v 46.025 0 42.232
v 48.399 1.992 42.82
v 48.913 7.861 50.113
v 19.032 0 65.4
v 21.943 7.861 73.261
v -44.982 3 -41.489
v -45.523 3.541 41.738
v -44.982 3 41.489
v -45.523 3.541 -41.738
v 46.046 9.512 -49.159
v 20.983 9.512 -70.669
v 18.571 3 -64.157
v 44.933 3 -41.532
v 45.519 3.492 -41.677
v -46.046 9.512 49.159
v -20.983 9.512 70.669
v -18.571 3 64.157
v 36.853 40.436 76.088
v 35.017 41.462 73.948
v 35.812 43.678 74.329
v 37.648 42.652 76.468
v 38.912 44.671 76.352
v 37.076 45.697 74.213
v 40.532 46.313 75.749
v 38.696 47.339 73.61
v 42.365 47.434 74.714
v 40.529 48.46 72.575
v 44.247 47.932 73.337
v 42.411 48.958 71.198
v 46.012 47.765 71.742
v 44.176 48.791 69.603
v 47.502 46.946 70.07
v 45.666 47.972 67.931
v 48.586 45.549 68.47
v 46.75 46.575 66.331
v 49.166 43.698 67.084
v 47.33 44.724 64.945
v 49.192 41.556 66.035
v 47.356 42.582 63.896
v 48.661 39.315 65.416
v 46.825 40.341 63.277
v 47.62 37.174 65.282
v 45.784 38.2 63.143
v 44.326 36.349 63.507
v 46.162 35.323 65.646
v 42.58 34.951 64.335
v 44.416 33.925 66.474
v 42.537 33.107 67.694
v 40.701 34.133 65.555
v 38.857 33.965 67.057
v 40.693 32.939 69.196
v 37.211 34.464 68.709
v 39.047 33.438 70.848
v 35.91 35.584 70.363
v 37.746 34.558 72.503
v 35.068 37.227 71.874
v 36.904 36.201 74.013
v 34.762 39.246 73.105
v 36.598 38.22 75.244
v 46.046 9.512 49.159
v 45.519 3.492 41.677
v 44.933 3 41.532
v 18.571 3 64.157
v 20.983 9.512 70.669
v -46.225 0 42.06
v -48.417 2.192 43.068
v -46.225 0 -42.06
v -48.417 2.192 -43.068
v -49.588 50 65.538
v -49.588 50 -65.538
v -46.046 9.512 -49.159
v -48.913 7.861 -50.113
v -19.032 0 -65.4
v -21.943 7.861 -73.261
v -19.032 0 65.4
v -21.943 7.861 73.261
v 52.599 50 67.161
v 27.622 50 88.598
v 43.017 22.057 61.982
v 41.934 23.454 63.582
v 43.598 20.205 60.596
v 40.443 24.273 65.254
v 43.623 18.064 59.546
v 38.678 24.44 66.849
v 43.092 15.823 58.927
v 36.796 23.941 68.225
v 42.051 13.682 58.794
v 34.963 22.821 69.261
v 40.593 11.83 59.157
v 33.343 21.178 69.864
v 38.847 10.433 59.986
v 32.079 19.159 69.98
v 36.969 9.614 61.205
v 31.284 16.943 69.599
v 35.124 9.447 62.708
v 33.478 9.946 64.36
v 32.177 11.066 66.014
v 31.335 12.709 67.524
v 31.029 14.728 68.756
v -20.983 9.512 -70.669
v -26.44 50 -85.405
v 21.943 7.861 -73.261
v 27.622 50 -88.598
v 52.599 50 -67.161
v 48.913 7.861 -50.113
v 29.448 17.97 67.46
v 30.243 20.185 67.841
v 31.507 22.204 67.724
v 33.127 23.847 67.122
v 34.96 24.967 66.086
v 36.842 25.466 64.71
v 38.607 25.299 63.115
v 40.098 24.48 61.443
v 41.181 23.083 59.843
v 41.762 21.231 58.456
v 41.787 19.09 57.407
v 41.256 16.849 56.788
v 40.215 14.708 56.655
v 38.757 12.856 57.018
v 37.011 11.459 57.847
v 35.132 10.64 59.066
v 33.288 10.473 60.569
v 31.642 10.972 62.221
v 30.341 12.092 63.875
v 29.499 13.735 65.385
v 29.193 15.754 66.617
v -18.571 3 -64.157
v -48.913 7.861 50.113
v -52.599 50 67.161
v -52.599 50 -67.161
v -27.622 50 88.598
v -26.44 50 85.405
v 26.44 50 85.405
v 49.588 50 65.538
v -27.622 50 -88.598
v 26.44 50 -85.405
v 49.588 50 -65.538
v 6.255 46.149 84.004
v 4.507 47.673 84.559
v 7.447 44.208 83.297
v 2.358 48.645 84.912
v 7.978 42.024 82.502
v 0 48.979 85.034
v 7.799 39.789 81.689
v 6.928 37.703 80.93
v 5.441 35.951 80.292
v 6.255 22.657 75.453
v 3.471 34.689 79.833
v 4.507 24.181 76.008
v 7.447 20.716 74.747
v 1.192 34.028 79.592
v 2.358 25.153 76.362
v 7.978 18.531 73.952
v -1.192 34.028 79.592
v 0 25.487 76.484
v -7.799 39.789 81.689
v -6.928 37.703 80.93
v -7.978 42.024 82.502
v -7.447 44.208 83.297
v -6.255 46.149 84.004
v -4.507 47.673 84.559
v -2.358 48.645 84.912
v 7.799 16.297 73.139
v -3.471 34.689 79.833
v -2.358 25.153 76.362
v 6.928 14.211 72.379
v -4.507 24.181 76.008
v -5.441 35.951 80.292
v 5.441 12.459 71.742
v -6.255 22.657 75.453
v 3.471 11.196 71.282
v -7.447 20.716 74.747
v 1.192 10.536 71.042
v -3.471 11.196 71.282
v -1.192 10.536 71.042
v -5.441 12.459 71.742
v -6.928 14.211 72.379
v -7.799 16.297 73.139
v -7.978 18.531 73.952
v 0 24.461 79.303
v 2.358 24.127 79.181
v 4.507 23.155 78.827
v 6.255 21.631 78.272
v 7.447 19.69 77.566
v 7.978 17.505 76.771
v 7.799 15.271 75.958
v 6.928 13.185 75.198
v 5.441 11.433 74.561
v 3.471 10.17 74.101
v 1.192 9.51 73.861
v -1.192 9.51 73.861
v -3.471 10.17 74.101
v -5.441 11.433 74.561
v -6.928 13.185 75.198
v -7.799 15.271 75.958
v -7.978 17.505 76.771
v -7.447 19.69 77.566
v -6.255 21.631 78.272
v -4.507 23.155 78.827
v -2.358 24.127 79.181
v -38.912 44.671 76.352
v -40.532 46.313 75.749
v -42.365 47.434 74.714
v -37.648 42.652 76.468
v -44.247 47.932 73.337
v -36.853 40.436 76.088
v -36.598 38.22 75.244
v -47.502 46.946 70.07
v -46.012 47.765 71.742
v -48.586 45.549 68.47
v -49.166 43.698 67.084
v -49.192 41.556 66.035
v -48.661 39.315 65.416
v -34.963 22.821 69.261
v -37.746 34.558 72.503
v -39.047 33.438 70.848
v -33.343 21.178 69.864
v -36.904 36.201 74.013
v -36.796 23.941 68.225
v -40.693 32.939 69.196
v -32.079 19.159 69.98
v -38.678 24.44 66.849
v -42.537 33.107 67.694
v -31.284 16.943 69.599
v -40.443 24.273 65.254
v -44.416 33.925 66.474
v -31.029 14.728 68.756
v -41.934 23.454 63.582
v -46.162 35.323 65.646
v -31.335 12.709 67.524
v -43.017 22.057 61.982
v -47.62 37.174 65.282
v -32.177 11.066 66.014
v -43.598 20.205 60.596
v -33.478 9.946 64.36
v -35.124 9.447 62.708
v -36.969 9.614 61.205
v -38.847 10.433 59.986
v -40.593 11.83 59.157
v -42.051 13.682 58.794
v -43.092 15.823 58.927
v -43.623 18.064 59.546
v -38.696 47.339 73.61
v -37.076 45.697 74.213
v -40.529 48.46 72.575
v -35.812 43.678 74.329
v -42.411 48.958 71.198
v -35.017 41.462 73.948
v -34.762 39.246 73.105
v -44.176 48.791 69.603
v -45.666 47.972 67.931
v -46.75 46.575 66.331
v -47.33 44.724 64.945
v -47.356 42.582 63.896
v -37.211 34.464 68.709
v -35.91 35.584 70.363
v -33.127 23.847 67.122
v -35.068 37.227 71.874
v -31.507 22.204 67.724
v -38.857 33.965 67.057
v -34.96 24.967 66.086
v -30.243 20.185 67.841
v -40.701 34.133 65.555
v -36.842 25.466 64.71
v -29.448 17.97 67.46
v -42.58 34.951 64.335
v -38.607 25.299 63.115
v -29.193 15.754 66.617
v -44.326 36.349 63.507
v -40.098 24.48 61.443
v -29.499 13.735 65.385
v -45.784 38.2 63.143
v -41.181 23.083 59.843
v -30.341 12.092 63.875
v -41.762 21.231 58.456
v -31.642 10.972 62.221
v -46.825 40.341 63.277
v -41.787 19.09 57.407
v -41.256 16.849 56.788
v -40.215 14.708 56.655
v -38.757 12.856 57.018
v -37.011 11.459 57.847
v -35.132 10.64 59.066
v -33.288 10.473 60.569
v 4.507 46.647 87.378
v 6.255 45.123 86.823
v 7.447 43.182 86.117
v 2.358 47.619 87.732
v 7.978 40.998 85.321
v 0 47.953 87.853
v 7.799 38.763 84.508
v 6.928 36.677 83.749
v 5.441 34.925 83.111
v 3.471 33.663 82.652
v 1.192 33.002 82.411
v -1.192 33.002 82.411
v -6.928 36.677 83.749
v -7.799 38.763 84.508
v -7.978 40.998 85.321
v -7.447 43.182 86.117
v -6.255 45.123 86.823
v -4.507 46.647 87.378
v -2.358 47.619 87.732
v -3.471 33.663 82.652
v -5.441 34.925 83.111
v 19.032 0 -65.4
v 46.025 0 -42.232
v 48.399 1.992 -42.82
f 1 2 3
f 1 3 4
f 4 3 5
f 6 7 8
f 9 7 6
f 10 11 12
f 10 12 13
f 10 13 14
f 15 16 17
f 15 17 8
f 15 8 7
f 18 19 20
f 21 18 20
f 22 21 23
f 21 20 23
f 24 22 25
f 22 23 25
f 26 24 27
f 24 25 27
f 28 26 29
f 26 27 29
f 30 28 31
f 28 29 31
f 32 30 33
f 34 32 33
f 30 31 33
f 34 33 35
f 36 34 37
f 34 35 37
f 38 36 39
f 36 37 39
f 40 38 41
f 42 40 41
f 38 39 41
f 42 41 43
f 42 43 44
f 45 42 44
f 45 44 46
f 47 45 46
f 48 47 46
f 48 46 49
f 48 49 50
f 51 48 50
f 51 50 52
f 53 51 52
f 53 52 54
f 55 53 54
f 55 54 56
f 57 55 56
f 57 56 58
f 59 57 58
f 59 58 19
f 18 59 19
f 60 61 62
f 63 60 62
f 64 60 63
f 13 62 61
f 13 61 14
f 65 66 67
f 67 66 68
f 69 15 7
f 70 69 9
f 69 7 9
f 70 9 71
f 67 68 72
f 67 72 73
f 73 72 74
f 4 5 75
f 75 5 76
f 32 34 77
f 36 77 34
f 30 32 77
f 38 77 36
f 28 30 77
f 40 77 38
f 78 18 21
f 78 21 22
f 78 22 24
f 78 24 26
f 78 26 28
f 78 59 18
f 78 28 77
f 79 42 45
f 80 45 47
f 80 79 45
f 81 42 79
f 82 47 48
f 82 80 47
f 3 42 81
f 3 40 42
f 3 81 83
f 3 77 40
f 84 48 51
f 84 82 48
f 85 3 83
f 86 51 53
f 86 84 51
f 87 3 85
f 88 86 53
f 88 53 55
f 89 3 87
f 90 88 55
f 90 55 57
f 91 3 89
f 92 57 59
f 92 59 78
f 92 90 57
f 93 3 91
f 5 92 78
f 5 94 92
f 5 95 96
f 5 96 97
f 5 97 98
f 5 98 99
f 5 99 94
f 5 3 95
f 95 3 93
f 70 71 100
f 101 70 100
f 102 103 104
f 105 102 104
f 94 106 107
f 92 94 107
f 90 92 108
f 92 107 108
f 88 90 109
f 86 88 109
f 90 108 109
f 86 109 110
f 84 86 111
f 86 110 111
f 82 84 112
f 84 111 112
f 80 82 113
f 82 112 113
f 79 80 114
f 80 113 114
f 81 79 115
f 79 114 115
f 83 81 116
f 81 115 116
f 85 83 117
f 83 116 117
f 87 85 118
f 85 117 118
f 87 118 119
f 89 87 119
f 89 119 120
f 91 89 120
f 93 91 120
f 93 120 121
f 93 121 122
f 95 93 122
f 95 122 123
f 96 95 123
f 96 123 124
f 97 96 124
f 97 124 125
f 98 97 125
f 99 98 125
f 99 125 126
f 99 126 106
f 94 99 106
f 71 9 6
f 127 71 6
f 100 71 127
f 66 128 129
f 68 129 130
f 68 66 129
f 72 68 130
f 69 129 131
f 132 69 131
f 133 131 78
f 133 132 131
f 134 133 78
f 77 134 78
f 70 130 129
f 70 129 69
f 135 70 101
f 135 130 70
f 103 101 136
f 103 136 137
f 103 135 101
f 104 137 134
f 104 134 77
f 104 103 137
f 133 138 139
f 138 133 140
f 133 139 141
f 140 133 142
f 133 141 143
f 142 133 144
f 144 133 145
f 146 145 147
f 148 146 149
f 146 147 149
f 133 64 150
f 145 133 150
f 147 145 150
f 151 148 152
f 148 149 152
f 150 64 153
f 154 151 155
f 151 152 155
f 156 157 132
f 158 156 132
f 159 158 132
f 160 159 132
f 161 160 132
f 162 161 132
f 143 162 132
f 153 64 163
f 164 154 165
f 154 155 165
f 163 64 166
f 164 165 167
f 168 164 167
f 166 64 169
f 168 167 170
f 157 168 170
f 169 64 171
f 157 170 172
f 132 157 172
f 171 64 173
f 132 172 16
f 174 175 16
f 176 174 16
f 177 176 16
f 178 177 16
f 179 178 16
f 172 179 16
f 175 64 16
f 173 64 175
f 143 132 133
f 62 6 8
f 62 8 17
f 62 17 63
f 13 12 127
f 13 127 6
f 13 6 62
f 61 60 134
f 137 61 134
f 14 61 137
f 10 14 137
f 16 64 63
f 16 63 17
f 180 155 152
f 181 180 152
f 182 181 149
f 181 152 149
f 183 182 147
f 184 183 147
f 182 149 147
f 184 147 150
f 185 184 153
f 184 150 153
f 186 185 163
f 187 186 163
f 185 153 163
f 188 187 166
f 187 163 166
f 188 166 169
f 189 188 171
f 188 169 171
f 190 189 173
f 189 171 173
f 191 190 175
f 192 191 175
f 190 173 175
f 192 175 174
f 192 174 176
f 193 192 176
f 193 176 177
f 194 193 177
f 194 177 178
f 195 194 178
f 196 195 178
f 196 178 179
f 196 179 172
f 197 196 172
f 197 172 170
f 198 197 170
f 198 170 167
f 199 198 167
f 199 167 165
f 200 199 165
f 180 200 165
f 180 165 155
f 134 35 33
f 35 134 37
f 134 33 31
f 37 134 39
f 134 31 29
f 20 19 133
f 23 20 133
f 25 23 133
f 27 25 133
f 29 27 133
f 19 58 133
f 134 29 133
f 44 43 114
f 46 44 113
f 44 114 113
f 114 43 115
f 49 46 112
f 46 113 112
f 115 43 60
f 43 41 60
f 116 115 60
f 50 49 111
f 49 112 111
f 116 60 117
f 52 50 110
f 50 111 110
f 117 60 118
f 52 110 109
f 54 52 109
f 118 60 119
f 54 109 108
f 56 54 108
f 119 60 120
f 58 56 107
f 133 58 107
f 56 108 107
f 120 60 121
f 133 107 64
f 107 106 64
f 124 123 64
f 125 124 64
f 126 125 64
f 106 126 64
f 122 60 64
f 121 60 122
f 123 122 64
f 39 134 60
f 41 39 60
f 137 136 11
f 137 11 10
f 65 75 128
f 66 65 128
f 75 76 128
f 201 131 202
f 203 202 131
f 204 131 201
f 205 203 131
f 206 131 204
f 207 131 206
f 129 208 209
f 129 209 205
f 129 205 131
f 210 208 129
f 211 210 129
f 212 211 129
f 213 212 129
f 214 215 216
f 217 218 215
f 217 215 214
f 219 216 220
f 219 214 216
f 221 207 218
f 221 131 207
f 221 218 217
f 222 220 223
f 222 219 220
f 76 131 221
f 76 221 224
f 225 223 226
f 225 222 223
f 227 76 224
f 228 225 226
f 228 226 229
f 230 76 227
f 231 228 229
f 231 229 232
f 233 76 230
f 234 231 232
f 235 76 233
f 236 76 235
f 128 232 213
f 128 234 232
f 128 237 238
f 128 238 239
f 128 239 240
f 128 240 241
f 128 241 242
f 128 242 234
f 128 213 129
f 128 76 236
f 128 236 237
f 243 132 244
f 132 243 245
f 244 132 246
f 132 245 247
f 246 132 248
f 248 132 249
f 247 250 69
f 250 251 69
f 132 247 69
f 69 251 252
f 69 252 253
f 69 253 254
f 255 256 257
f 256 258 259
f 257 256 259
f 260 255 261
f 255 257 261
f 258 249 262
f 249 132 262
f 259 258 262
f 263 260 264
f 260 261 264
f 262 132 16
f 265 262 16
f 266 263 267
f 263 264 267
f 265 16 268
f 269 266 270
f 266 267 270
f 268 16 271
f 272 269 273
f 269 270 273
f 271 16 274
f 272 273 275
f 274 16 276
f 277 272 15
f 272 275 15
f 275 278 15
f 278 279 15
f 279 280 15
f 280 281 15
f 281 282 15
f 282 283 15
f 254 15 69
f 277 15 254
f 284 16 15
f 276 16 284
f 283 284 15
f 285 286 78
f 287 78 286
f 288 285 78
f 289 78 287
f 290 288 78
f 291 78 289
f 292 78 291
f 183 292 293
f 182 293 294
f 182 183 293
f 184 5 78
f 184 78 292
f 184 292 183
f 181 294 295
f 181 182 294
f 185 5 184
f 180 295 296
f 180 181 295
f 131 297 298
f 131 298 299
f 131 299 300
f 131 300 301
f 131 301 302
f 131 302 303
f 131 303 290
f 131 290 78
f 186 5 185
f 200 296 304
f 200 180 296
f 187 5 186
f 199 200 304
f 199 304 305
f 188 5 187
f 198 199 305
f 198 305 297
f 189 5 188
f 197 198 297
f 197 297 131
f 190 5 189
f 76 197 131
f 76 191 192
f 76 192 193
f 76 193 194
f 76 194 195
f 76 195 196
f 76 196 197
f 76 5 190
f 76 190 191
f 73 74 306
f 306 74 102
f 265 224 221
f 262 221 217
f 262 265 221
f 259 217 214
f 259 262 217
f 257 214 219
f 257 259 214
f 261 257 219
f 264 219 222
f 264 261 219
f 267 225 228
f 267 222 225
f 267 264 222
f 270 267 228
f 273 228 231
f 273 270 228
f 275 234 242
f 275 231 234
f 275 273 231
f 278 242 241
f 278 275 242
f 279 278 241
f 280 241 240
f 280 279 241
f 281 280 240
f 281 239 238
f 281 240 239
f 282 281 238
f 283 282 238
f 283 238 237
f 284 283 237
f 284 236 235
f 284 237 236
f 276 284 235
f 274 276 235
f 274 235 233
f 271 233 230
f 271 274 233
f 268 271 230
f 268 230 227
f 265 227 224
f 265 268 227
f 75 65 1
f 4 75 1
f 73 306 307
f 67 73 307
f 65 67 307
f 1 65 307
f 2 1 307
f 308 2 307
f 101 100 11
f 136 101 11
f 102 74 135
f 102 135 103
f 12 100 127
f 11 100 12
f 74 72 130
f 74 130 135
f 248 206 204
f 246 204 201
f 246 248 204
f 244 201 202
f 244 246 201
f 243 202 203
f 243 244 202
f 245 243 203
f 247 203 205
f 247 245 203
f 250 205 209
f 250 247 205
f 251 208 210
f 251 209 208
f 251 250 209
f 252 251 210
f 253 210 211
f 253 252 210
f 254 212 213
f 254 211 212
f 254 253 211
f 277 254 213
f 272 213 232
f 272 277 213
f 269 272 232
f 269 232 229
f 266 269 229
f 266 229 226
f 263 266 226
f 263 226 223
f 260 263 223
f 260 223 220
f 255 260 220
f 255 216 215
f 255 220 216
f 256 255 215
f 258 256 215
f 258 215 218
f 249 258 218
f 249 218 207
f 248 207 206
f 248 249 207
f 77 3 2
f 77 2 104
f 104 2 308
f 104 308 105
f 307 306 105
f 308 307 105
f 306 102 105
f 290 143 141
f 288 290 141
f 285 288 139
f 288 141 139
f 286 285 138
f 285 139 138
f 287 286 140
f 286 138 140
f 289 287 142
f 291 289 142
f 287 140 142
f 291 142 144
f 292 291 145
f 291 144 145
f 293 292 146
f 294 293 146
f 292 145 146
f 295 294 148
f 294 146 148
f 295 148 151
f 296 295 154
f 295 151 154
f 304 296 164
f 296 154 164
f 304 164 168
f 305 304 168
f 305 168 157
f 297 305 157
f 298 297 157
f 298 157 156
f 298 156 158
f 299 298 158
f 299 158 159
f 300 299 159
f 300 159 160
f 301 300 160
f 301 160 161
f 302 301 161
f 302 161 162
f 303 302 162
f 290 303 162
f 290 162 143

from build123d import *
from OCP.BRepFilletAPI import BRepFilletAPI_MakeChamfer

# Parameters (mm, degrees)
SKETCH1_W             = 96.449496644
SKETCH1_H             = 93.866027984
BOSS_EXTRUDE1_DEPTH   = 50
DRAFT1_ANGLE          = 20
DRAFT2_ANGLE          = 5
CHAMFER1_SIZE         = 5
CHAMFER1_SIZE2        = 8.365785926
CHAMFER1_EDGE_2_SIZE  = 5
CHAMFER1_EDGE_2_SIZE2 = 8.365785926
CHAMFER1_EDGE_3_SIZE  = 5
CHAMFER1_EDGE_3_SIZE2 = 8.365785926
CHAMFER1_EDGE_4_SIZE  = 5
CHAMFER1_EDGE_4_SIZE2 = 8.365785926
CHAMFER1_EDGE_5_SIZE  = 5
CHAMFER1_EDGE_5_SIZE2 = 8.365785926
CHAMFER1_EDGE_6_SIZE  = 5
CHAMFER1_EDGE_6_SIZE2 = 8.365785926
CHAMFER2_SIZE         = 2
CHAMFER2_SIZE2        = 2.200125735
SHELL1_T              = -3
SKETCH2_R             = 8
CUT_EXTRUDE1_DEPTH    = 174.798113009
SKETCH3_R             = 8
CUT_EXTRUDE2_DEPTH    = 173.570101234


with BuildPart() as part:
    # Sketch1 → Boss-Extrude1 (new body)
    with BuildSketch(Plane(origin=(0, 0, 0), x_dir=(1, 0, 0), z_dir=(0, 1, 0))):
        Rectangle(SKETCH1_W, SKETCH1_H)
        Polygon((20.883038336, 70.399520989), (48.224748322, 46.933013992), (-48.224748322, 46.933013992), (-20.883038336, 70.399520989), align=None)
        Polygon((-48.224748322, -46.933013992), (48.224748322, -46.933013992), (20.883038336, -70.399520989), (-20.883038336, -70.399520989), align=None)
    extrude(amount=BOSS_EXTRUDE1_DEPTH)

    # Draft1
    draft1_faces = [part.faces().sort_by_distance(p)[0] for p in [
        (-34.553893329, 25, 58.66626749),
        (-34.553893329, 25, -58.66626749),
        (0, 25, -70.399520989),
        (34.553893329, 25, -58.66626749),
        (34.553893329, 25, 58.66626749),
        (0, 25, 70.399520989),
    ]]
    draft(draft1_faces, Plane(origin=(0, 0, 0), x_dir=(0, 0, -1), z_dir=(0, -1, 0)), DRAFT1_ANGLE)

    # Draft2
    draft2_faces = [part.faces().sort_by_distance(p)[0] for p in [
        (48.224748322, 26.695838409, 0),
        (-48.224748322, 26.695838409, 0),
    ]]
    draft(draft2_faces, Plane(origin=(0, 0, 0), x_dir=(0, 0, -1), z_dir=(0, -1, 0)), DRAFT2_ANGLE)

    # Chamfer1
    chamfer1_edges = [part.edges().sort_by_distance(p)[0] for p in [
        (0, 0, 70.399520989),
    ]]
    chamfer1_side = [part.faces().sort_by_distance(p)[0] for p in [
        (0, 0, 0),
    ]]
    chamfer(chamfer1_edges, length=CHAMFER1_SIZE, length2=CHAMFER1_SIZE2, reference=chamfer1_side[0])

    # Chamfer1 edge 2
    chamfer1_edge_2_edges = [part.edges().sort_by_distance(p)[0] for p in [
        (-34.553893329, 0, 58.66626749),
    ]]
    chamfer1_edge_2_side = [part.faces().sort_by_distance(p)[0] for p in [
        (0, 0, 0),
    ]]
    chamfer(chamfer1_edge_2_edges, length=CHAMFER1_EDGE_2_SIZE, length2=CHAMFER1_EDGE_2_SIZE2, reference=chamfer1_edge_2_side[0])

    # Chamfer1 edge 3
    chamfer1_edge_3_edges = [part.edges().sort_by_distance(p)[0] for p in [
        (-34.553893329, 0, -58.66626749),
    ]]
    chamfer1_edge_3_side = [part.faces().sort_by_distance(p)[0] for p in [
        (0, 0, 0),
    ]]
    chamfer(chamfer1_edge_3_edges, length=CHAMFER1_EDGE_3_SIZE, length2=CHAMFER1_EDGE_3_SIZE2, reference=chamfer1_edge_3_side[0])

    # Chamfer1 edge 4
    chamfer1_edge_4_edges = [part.edges().sort_by_distance(p)[0] for p in [
        (0, 0, -70.399520989),
    ]]
    chamfer1_edge_4_side = [part.faces().sort_by_distance(p)[0] for p in [
        (0, 0, 0),
    ]]
    chamfer(chamfer1_edge_4_edges, length=CHAMFER1_EDGE_4_SIZE, length2=CHAMFER1_EDGE_4_SIZE2, reference=chamfer1_edge_4_side[0])

    # Chamfer1 edge 5
    chamfer1_edge_5_edges = [part.edges().sort_by_distance(p)[0] for p in [
        (34.553893329, 0, -58.66626749),
    ]]
    chamfer1_edge_5_side = [part.faces().sort_by_distance(p)[0] for p in [
        (0, 0, 0),
    ]]
    chamfer(chamfer1_edge_5_edges, length=CHAMFER1_EDGE_5_SIZE, length2=CHAMFER1_EDGE_5_SIZE2, reference=chamfer1_edge_5_side[0])

    # Chamfer1 edge 6
    chamfer1_edge_6_edges = [part.edges().sort_by_distance(p)[0] for p in [
        (34.553893329, 0, 58.66626749),
    ]]
    chamfer1_edge_6_side = [part.faces().sort_by_distance(p)[0] for p in [
        (0, 0, 0),
    ]]
    chamfer(chamfer1_edge_6_edges, length=CHAMFER1_EDGE_6_SIZE, length2=CHAMFER1_EDGE_6_SIZE2, reference=chamfer1_edge_6_side[0])

    # Chamfer2: one chamfer whose edges measure the first distance from different faces: ONE call of the kernel's chamfer builder (chamfer() names one face for all edges)
    chamfer2_edges_1 = [part.edges().sort_by_distance(p)[0] for p in [
        (48.224748322, 0, 0),
    ]]
    chamfer2_side_1 = [part.faces().sort_by_distance(p)[0] for p in [
        (50.560348002, 26.696026495, 0),
    ]]
    chamfer2_edges_2 = [part.edges().sort_by_distance(p)[0] for p in [
        (-48.224748322, 0, 0),
    ]]
    chamfer2_side_2 = [part.faces().sort_by_distance(p)[0] for p in [
        (0, 0, 0),
    ]]
    chamfer2 = BRepFilletAPI_MakeChamfer(part.part.solid().wrapped)
    for e in chamfer2_edges_1:
        chamfer2.Add(CHAMFER2_SIZE, CHAMFER2_SIZE2, e.wrapped, chamfer2_side_1[0].wrapped)  # the first distance lies on this face
    for e in chamfer2_edges_2:
        chamfer2.Add(CHAMFER2_SIZE, CHAMFER2_SIZE2, e.wrapped, chamfer2_side_2[0].wrapped)  # the first distance lies on this face
    add(Compound.cast(chamfer2.Shape()), mode=Mode.REPLACE)

    # Shell1
    shell1_openings = [part.faces().sort_by_distance(p)[0] for p in [
        (0, 50, 0),
    ]]
    offset(amount=SHELL1_T, openings=shell1_openings, kind=Kind.INTERSECTION)

    # Sketch2 → Cut-Extrude1 (cut, through all)
    with BuildSketch(Plane(origin=(36.708388619, -20.5145146, 42.770324355), x_dir=(-0.7908530317789993, -0.26467423150818037, 0.5518143105262125), z_dir=(-0.6120061128174825, 0.3420201433256695, -0.7130713424570668))):
        with Locations(Location((-5.537538823, 67.111220428, 0), (0, 0, 16.359329629))):
            Circle(SKETCH2_R)
        with Locations(Location((1.503972029, 43.123366733, 0), (0, 0, 16.359329629))):
            Circle(SKETCH2_R)
    cut_extrude1 = extrude(amount=-CUT_EXTRUDE1_DEPTH, mode=Mode.SUBTRACT)

    # Sketch3 → Cut-Extrude2 (cut, through all)
    with BuildSketch(Plane(origin=(0, -21.59990948, 59.345263558), x_dir=(-1, 0, 0), z_dir=(0, 0.34202014332566943, -0.9396926207859082))):
        with Locations(Location((0, 67.108924172, 0), (0, 0, 90))):
            Circle(SKETCH3_R)
        with Locations(Location((0, 42.108924172, 0), (0, 0, 90))):
            Circle(SKETCH3_R)
    extrude(amount=-CUT_EXTRUDE2_DEPTH, mode=Mode.SUBTRACT)

    # Mirror1: Cut-Extrude1 across plane
    add(cut_extrude1.mirror(Plane(origin=(0, 0, 0), x_dir=(0, 0, 1), z_dir=(1, 0, 0))), mode=Mode.SUBTRACT)


solid = part.part
